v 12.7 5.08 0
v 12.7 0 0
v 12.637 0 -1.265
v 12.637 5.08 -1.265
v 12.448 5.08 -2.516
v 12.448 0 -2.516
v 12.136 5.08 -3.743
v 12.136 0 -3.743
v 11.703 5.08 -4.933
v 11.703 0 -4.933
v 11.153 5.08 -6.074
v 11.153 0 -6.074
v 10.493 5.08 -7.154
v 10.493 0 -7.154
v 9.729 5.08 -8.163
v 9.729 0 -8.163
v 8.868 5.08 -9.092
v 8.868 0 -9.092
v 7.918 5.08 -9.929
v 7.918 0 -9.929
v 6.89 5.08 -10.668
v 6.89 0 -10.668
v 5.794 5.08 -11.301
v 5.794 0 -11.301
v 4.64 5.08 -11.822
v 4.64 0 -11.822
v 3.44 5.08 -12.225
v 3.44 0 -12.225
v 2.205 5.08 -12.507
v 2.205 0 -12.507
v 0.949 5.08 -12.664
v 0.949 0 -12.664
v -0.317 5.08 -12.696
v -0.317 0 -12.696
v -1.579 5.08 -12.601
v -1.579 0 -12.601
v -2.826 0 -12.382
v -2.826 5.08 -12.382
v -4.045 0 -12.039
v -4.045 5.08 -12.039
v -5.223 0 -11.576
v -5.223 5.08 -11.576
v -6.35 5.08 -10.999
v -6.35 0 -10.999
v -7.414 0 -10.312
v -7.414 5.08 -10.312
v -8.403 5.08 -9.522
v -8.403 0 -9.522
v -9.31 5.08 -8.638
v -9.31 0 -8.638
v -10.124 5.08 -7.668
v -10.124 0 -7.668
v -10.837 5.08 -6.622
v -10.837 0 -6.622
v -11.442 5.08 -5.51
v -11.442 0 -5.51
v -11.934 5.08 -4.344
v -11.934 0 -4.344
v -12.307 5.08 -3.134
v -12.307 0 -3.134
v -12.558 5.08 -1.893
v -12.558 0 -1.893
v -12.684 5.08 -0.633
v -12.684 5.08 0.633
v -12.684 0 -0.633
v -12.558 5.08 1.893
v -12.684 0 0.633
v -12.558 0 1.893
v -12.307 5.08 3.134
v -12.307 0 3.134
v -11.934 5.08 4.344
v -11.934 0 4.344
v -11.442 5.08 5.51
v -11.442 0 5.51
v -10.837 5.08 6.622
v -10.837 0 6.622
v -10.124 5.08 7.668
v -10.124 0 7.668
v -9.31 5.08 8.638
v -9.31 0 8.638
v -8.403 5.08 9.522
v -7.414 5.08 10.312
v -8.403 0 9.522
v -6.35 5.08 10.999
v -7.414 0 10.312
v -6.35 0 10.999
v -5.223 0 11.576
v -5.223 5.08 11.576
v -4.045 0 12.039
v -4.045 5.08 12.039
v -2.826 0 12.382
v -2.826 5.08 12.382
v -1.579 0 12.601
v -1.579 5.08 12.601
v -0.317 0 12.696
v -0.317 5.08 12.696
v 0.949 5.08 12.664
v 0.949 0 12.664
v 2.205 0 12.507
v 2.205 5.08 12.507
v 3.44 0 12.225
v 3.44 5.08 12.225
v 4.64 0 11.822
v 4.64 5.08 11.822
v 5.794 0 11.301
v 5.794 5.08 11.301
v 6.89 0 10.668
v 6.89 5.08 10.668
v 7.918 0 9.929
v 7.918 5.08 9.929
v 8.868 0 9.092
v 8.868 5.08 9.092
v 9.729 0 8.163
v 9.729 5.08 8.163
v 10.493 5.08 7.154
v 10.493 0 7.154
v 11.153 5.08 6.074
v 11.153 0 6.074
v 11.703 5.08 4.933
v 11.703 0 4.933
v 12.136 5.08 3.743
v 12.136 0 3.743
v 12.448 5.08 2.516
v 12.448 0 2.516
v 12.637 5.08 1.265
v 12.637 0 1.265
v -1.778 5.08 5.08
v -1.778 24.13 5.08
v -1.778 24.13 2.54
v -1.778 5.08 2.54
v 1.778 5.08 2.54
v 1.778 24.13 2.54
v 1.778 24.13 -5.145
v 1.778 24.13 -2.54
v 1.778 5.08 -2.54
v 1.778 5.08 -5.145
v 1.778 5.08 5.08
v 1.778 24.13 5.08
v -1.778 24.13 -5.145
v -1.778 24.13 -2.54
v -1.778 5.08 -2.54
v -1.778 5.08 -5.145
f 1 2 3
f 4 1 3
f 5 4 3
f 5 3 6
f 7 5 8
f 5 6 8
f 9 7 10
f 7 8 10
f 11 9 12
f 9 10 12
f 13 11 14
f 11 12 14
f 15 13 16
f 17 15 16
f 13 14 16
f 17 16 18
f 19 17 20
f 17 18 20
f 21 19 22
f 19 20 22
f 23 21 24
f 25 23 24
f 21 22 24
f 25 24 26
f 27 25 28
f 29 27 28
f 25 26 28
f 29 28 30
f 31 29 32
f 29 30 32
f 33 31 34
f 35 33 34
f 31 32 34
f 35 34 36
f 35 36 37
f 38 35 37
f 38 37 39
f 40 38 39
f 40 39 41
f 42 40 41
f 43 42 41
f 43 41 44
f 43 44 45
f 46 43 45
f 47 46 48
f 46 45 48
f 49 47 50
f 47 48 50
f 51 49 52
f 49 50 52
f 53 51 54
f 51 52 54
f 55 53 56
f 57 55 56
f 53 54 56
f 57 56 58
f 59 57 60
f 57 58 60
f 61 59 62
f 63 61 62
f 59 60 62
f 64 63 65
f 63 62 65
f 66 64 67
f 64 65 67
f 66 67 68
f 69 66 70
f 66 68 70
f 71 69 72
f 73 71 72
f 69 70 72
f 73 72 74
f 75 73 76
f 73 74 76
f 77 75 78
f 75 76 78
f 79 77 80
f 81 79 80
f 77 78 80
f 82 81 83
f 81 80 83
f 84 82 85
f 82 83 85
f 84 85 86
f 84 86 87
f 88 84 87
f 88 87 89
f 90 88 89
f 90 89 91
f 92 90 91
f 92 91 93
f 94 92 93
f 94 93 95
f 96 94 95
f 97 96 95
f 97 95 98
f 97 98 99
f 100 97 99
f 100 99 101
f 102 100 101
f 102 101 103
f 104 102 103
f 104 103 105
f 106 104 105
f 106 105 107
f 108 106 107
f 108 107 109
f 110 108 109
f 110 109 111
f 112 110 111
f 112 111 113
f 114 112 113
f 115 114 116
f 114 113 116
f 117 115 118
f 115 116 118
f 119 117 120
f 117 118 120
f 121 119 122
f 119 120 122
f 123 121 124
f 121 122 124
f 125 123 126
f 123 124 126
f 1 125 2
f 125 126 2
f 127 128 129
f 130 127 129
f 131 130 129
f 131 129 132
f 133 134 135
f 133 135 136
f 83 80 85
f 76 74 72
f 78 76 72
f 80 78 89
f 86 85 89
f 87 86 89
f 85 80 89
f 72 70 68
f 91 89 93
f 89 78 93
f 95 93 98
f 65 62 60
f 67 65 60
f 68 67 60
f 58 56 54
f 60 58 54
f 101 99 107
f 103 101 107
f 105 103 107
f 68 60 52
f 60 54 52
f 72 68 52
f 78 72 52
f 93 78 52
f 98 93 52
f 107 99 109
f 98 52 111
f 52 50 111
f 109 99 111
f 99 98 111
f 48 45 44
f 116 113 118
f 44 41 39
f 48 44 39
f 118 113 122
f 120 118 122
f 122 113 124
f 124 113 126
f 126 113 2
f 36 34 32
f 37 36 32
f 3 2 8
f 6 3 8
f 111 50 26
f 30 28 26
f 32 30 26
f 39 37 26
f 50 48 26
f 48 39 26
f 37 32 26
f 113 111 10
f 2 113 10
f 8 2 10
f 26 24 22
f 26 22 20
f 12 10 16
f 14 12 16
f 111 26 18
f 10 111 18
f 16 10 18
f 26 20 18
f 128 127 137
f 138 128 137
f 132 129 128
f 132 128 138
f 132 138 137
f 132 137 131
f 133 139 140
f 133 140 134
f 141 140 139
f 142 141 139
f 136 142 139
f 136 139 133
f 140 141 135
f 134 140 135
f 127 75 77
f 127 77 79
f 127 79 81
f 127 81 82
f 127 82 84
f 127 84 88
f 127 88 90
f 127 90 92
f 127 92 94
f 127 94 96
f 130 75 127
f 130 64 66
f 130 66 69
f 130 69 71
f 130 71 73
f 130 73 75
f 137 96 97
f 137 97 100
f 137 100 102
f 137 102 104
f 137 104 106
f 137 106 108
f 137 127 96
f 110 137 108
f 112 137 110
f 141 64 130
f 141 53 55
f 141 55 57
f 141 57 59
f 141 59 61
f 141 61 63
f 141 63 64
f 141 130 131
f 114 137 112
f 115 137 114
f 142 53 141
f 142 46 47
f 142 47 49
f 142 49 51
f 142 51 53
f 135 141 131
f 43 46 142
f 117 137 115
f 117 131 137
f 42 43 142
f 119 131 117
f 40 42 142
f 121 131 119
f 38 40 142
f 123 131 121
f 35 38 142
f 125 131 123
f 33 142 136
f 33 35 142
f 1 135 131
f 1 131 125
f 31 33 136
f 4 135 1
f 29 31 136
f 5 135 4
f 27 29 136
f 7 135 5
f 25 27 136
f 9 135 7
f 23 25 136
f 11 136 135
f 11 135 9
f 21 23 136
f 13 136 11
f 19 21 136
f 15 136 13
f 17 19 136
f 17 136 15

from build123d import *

# Parameters (mm, degrees)
SKETCH1_R           = 12.7
BOSS_EXTRUDE1_DEPTH = 5.08
SKETCH2_W           = 3.556
SKETCH2_H           = 2.604656918
SKETCH2_H_2         = 2.54
BOSS_EXTRUDE2_DEPTH = 19.05


with BuildPart() as part:
    # Sketch1 → Boss-Extrude1 (new body)
    with BuildSketch(Plane(origin=(0, 0, 0), x_dir=(1, 0, 0), z_dir=(0, 1, 0))):
        Circle(SKETCH1_R)
    extrude(amount=BOSS_EXTRUDE1_DEPTH)

    # Sketch2 → Boss-Extrude2 (add)
    with BuildSketch(Plane(origin=(0, 5.08, 0), x_dir=(1, 0, 0), z_dir=(0, 1, 0))):
        with Locations((0, 3.842328459)):
            Rectangle(SKETCH2_W, SKETCH2_H)
        with Locations((0, -3.81)):
            Rectangle(SKETCH2_W, SKETCH2_H_2)
    extrude(amount=BOSS_EXTRUDE2_DEPTH)


solid = part.part
